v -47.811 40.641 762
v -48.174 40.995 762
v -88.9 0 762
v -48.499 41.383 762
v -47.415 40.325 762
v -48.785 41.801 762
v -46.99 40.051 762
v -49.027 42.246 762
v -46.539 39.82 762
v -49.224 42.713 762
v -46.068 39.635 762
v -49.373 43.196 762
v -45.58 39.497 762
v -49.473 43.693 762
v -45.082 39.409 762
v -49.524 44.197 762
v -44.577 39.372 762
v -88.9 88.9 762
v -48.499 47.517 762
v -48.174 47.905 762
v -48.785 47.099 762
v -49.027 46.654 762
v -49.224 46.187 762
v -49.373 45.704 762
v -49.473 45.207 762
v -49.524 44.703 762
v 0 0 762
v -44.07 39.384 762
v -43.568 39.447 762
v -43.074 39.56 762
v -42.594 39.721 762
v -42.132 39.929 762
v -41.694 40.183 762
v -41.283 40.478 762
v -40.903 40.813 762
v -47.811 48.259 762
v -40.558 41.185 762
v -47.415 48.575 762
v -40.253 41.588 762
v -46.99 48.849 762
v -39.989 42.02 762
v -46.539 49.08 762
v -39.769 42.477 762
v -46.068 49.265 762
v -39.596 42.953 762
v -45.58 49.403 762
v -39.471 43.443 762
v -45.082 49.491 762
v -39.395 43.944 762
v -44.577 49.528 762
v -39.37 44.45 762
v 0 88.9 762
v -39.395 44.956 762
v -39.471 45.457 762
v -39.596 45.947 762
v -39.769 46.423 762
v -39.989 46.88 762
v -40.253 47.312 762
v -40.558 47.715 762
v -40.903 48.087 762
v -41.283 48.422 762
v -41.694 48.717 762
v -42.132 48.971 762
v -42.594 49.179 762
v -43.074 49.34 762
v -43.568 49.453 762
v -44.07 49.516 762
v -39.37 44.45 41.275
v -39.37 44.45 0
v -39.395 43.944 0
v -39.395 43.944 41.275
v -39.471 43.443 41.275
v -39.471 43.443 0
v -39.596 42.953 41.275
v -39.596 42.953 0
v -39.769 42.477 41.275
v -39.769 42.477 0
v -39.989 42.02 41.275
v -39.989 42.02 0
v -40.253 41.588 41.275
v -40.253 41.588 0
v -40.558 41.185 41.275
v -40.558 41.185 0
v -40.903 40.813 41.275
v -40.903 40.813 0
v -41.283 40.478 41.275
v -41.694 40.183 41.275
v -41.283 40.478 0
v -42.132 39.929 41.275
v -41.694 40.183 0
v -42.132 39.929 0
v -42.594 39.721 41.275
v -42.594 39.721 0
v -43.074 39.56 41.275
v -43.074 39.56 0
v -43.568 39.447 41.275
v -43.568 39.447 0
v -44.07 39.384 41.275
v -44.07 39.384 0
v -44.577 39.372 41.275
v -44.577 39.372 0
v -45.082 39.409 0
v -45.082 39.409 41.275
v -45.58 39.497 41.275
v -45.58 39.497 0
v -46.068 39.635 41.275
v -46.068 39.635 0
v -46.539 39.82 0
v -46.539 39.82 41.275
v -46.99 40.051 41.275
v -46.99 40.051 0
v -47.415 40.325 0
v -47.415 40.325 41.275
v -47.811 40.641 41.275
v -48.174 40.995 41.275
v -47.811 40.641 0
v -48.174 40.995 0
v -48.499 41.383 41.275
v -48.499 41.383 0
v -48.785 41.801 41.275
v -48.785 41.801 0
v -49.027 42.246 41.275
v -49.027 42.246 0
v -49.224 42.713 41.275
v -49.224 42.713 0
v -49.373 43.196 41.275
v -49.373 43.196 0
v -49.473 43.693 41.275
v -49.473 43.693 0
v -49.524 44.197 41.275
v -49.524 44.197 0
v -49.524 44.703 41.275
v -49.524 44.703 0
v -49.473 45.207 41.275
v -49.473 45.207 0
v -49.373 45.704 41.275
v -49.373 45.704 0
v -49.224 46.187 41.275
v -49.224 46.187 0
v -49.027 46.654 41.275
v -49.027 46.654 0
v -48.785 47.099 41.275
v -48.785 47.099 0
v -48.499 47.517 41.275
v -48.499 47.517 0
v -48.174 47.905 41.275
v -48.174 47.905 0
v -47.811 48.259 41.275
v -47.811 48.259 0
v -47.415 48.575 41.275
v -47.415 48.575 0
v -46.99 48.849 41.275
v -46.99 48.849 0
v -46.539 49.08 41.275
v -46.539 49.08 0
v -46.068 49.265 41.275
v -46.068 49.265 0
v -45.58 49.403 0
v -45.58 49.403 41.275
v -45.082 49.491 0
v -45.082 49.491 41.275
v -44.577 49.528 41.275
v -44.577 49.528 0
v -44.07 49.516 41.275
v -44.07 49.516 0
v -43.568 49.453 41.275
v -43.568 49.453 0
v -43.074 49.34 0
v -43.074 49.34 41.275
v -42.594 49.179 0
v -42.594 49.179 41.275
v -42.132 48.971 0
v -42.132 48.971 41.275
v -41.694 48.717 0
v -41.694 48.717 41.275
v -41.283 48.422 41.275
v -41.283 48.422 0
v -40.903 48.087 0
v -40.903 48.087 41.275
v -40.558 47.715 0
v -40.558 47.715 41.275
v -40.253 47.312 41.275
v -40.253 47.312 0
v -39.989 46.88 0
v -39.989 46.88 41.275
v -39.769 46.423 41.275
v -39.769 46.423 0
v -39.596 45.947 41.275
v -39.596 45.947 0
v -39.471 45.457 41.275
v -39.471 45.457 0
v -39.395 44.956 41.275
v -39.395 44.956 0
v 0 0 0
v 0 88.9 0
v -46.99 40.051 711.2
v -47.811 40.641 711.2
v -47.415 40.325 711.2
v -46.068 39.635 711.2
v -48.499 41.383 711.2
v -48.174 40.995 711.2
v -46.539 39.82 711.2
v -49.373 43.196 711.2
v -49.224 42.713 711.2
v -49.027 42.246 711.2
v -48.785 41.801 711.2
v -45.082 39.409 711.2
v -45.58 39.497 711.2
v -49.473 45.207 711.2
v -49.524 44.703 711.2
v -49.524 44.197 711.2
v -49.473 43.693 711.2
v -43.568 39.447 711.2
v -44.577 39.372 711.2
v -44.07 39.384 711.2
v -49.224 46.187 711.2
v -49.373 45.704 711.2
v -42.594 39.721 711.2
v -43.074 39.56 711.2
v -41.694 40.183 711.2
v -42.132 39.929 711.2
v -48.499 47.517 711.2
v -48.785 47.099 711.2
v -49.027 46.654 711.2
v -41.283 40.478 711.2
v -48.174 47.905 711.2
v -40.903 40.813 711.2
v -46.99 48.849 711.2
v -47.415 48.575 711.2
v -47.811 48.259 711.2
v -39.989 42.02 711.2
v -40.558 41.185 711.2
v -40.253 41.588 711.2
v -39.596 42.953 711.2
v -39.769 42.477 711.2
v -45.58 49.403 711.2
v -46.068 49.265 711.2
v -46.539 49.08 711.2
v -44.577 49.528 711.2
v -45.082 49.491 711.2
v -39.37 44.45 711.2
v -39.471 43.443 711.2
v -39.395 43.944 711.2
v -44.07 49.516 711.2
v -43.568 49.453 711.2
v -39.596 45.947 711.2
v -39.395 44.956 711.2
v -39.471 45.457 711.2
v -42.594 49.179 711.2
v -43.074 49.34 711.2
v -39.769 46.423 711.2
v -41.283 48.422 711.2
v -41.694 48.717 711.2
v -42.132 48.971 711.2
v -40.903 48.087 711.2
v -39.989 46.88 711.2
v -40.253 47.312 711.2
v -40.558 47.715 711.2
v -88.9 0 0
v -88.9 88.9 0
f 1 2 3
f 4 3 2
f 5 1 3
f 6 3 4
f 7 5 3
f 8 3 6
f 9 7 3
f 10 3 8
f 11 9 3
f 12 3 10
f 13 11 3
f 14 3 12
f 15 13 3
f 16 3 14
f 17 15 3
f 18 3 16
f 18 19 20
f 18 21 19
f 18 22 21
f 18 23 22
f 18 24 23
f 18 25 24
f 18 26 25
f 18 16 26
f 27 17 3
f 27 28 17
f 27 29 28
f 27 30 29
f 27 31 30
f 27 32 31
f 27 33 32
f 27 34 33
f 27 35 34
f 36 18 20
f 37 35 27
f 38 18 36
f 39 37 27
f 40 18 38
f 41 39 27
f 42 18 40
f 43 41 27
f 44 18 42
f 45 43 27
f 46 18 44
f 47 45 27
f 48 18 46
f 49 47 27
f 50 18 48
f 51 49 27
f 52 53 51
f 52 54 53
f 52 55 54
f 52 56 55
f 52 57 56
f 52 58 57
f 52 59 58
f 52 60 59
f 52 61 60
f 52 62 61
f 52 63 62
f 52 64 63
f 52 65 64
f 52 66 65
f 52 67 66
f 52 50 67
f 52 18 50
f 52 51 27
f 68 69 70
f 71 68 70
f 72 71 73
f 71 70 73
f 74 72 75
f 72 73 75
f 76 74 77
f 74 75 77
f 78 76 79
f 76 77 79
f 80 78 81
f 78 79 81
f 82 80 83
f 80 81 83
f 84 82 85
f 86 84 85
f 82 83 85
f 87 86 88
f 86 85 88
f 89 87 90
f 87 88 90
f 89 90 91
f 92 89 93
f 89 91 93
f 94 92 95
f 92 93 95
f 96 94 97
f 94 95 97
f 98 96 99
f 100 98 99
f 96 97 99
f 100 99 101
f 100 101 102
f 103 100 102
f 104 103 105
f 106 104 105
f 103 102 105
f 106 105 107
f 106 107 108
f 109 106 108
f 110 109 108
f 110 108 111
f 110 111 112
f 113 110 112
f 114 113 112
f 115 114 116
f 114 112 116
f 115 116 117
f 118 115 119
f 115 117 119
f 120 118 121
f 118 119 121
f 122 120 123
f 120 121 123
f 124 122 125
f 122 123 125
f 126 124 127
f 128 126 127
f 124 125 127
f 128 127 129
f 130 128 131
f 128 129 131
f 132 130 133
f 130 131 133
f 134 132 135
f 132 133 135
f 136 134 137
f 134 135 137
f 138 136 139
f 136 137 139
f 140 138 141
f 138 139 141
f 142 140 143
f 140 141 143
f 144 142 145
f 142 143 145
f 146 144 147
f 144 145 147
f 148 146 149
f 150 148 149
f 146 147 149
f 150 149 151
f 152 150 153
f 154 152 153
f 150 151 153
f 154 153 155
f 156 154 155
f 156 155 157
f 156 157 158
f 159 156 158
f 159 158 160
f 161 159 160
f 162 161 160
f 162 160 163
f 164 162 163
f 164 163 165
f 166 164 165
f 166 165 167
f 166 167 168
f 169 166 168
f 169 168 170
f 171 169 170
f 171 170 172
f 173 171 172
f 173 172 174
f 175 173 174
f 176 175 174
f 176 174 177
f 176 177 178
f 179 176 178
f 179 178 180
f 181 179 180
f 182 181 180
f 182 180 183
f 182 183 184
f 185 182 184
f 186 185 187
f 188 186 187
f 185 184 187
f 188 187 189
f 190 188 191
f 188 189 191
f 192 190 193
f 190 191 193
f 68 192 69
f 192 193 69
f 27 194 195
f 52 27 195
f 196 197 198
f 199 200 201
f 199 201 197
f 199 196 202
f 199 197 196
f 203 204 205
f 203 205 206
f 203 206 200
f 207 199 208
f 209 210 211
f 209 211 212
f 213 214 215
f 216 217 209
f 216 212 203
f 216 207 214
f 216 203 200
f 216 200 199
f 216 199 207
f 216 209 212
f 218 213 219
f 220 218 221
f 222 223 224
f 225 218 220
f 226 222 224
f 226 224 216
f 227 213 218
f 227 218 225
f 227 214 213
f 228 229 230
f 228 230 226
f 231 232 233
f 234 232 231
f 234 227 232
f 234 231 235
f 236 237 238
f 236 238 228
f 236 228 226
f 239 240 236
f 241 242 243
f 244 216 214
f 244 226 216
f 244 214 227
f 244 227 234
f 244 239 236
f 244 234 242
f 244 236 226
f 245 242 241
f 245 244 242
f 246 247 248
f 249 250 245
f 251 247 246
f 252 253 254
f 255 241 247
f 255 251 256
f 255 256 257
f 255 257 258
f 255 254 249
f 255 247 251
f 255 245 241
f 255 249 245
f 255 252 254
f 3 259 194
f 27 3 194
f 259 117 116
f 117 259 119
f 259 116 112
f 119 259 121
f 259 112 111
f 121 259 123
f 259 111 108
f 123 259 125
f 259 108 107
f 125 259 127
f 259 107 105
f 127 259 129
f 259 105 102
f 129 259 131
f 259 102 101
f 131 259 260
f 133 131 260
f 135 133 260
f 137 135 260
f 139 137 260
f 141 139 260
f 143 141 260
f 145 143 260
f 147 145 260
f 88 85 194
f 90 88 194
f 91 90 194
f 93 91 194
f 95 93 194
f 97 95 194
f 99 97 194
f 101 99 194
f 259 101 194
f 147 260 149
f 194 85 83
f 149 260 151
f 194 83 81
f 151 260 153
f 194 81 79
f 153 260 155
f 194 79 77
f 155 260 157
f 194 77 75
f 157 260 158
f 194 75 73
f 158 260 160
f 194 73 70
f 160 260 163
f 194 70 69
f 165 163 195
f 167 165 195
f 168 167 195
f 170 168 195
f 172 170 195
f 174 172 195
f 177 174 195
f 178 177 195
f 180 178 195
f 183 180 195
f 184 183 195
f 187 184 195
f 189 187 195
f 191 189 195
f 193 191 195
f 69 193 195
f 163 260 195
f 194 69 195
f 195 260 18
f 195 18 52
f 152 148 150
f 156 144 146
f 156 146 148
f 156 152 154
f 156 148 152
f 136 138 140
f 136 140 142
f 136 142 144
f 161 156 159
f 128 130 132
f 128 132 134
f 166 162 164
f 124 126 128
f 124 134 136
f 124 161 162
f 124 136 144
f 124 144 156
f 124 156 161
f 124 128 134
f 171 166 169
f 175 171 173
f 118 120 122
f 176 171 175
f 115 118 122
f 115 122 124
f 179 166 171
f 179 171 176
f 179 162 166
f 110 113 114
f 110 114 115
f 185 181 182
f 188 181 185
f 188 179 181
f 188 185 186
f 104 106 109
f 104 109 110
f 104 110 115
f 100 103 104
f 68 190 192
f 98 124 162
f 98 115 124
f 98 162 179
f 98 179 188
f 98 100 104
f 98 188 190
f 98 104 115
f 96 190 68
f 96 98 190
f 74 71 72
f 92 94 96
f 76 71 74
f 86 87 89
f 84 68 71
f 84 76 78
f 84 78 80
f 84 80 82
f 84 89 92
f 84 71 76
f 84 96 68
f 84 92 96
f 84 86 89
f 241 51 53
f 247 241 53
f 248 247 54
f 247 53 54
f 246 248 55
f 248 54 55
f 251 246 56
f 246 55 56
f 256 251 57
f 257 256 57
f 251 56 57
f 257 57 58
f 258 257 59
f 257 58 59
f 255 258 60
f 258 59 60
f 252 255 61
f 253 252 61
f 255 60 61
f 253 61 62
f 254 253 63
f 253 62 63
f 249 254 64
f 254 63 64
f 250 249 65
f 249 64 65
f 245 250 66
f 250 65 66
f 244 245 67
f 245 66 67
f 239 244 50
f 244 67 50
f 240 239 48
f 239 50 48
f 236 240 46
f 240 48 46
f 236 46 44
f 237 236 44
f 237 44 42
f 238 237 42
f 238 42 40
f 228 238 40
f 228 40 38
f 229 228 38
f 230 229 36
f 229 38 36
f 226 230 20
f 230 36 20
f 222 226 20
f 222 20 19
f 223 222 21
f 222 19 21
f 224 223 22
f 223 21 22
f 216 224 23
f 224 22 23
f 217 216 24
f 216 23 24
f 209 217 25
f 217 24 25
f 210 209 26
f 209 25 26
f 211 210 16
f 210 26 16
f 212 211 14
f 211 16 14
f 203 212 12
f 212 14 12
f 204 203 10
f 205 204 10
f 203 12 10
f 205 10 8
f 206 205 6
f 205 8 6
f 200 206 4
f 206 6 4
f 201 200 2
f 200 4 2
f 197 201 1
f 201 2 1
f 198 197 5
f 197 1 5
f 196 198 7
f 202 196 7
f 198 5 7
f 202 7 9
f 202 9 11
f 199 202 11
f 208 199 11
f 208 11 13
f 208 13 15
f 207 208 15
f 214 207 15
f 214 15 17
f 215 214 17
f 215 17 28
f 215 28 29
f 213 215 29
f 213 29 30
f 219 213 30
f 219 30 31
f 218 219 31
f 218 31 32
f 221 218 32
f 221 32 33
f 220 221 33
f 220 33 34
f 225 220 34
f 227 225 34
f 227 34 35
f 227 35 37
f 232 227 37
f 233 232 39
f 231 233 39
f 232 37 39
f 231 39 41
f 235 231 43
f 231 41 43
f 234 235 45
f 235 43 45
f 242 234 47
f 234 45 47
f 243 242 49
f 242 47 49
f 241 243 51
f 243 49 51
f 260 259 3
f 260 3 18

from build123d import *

# Parameters (mm, degrees)
F0_W     = 88.9
F0_H     = 88.9
F1_DEPTH = 762
F2_R     = 5.08
F3_DEPTH = 50.8
F4_R     = 5.08
F5_DEPTH = 41.275


with BuildPart() as f1:
    # F0 (on Top) → F1 (new body)
    with BuildSketch(Plane.XY):
        with Locations((-44.45, 44.45)):
            Rectangle(F0_W, F0_H)
    extrude(amount=F1_DEPTH)

    # F2 (on face) → F3 (cut)
    with BuildSketch(Plane.XY.offset(762)):
        with Locations((-44.45, 44.45)):
            Circle(F2_R)
    extrude(amount=-F3_DEPTH, mode=Mode.SUBTRACT)

    # F4 (on face) → F5 (cut)
    with BuildSketch(Plane(origin=(0, 0, 0), x_dir=(1, 0, 0), z_dir=(0, 0, -1))):
        with Locations((-44.45, -44.45)):
            Circle(F4_R)
    extrude(amount=-F5_DEPTH, mode=Mode.SUBTRACT)


solid = f1.part
